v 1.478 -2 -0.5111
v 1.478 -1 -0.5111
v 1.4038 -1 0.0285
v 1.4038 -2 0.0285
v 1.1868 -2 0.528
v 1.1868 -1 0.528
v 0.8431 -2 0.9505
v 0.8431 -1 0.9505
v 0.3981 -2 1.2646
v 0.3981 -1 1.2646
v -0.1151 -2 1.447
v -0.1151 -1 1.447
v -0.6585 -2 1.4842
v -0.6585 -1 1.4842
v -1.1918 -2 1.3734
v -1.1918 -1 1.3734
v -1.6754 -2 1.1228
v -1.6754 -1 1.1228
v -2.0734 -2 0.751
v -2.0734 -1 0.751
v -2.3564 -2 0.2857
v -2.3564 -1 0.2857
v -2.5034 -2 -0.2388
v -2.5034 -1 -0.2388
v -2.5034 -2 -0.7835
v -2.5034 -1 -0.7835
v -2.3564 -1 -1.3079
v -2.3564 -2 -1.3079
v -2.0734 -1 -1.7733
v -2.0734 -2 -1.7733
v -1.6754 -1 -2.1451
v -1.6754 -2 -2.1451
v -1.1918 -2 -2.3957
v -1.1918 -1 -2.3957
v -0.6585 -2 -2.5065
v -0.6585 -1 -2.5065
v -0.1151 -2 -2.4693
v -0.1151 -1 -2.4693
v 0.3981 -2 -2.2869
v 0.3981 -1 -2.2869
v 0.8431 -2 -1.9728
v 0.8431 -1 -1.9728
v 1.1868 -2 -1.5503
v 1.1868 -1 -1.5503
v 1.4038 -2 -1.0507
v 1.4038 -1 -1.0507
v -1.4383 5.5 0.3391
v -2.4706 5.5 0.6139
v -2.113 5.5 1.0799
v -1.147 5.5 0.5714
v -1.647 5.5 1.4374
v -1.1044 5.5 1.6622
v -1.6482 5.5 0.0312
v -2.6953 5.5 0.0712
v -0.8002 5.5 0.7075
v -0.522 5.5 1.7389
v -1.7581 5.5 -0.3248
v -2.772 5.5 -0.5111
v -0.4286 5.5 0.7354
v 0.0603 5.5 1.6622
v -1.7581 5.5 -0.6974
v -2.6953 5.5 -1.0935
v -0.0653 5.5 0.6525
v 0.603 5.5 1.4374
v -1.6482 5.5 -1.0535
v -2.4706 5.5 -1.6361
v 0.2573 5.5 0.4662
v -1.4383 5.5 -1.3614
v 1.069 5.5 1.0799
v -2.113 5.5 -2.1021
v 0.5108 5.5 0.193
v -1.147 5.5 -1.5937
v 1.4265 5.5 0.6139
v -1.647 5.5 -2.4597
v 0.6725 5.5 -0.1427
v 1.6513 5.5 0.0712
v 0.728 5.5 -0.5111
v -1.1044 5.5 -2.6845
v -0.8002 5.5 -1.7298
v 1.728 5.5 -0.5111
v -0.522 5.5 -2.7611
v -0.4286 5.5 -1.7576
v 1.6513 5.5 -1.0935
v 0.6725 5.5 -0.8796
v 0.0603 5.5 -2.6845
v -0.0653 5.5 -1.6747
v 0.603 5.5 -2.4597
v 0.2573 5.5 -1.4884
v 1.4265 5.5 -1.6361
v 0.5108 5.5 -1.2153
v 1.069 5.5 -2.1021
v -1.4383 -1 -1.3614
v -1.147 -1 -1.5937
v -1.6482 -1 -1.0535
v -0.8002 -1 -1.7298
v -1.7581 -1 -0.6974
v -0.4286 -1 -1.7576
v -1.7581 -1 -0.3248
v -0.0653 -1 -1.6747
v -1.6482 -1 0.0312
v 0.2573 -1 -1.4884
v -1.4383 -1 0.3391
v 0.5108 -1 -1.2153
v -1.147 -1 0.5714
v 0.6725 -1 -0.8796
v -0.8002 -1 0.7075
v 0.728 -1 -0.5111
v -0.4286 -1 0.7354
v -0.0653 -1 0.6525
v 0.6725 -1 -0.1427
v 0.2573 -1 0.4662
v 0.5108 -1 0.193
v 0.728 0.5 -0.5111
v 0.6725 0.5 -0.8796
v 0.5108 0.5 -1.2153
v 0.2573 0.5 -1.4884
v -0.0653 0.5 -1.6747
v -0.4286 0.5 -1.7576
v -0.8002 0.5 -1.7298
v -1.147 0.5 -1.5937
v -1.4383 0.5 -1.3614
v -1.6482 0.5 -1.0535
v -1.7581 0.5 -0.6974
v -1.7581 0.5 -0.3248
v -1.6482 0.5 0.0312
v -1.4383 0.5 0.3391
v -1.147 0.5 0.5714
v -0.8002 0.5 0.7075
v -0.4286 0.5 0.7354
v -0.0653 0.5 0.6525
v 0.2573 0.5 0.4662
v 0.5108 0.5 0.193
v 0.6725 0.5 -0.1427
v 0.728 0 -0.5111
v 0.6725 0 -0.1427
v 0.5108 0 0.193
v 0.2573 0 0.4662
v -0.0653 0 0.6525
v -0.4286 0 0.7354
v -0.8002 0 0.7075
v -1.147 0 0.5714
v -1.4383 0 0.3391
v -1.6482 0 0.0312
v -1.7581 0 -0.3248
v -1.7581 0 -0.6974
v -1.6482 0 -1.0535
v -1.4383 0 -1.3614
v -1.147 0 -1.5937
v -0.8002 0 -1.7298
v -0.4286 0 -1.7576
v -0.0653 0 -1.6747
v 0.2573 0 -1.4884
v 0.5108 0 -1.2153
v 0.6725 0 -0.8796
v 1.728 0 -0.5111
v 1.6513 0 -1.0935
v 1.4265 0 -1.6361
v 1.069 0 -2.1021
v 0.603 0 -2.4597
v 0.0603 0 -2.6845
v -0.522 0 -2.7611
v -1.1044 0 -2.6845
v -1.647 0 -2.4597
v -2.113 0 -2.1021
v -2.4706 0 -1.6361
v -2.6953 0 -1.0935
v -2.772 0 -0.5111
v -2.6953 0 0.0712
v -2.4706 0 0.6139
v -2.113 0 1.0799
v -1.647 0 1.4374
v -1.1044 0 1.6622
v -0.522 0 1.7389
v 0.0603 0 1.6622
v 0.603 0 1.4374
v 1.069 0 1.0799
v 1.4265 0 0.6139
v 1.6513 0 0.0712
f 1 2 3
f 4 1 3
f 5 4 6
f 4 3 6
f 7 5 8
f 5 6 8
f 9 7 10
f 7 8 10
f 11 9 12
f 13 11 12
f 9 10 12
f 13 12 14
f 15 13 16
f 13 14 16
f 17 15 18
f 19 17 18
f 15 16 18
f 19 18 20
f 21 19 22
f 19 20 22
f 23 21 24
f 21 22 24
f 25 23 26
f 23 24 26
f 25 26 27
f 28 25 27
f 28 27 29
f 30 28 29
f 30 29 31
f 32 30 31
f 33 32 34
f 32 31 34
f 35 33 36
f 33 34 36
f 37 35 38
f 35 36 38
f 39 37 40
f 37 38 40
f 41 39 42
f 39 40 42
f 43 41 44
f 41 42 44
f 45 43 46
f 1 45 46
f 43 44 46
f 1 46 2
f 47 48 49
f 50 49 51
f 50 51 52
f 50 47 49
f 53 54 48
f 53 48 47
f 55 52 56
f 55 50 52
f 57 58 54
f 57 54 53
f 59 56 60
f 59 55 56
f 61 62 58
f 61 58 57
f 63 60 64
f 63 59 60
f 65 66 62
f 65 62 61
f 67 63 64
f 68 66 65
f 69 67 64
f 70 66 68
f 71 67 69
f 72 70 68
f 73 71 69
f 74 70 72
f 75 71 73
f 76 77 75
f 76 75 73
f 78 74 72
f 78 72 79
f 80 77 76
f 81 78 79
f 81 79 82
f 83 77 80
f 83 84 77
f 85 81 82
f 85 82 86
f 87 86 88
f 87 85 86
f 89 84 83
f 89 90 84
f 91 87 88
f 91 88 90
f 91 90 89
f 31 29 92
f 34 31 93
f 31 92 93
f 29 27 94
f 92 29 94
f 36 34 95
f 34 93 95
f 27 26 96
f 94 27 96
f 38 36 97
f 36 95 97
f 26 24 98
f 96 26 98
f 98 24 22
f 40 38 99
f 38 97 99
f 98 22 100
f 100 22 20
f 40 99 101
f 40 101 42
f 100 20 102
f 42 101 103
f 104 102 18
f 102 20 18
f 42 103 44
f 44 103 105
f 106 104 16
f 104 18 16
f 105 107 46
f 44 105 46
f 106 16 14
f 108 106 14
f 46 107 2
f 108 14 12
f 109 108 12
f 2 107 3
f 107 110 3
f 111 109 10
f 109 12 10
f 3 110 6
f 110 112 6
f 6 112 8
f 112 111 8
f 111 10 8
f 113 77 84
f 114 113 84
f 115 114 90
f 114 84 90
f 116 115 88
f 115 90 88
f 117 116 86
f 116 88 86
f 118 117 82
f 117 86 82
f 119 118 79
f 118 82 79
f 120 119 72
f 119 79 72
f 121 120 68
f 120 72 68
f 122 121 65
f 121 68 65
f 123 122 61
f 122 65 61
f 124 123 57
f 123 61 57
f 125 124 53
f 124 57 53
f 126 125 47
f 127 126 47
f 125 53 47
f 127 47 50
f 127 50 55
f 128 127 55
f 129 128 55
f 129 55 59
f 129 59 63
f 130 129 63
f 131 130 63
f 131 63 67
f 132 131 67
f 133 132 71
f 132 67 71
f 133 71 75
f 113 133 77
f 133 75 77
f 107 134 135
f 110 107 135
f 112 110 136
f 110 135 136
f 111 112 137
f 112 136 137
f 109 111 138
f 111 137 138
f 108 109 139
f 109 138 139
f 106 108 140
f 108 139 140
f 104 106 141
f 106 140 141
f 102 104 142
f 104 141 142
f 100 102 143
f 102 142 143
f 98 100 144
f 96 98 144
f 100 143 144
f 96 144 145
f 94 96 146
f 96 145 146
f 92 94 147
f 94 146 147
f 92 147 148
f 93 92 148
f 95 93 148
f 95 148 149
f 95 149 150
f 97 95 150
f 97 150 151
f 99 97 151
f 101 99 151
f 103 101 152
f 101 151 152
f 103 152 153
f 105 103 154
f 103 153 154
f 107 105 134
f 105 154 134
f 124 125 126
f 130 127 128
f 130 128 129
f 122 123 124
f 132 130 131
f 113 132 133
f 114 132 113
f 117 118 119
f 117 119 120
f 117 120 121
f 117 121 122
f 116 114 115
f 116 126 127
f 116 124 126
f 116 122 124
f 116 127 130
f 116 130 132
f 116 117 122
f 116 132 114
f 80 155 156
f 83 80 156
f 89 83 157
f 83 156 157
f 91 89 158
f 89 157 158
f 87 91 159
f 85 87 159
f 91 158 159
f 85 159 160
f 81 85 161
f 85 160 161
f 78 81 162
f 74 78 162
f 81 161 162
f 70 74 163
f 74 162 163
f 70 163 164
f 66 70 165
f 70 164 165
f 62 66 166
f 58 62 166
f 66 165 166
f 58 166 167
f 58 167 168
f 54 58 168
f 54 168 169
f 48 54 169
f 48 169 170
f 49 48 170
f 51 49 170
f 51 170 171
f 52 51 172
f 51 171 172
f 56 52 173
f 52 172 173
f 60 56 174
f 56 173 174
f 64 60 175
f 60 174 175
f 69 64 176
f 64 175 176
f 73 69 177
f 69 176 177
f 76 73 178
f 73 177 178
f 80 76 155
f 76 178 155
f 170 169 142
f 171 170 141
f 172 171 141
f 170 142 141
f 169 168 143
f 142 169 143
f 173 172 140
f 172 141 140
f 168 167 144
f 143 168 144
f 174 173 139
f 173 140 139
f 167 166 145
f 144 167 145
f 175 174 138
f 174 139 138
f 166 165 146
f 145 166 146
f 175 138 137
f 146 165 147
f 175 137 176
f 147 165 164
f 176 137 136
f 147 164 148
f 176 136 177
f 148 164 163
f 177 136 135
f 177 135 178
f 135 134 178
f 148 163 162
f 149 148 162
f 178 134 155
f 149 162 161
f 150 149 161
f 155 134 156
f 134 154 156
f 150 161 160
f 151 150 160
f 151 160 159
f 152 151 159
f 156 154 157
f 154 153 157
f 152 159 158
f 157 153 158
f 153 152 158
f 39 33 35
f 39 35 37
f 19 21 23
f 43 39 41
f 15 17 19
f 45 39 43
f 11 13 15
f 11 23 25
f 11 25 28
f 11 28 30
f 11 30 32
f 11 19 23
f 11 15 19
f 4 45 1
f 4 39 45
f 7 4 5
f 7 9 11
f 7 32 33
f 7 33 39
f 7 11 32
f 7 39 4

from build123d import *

# Parameters (mm, degrees)
SKETCH1_R           = 2.25
BOSS_EXTRUDE1_DEPTH = 5.5
SKETCH1_3_R         = 1.25
BOSS_EXTRUDE2_DEPTH = 1
SKETCH5_R           = 1.25
BOSS_EXTRUDE3_DEPTH = 1
SKETCH6_R           = 2
BOSS_EXTRUDE4_DEPTH = 1
SKETCH12_R          = 1.25
CUT_EXTRUDE1_DEPTH  = 5


with BuildPart() as part:
    # Sketch1 → Boss-Extrude1 (new body)
    with BuildSketch(Plane(origin=(0, 0, 0), x_dir=(1, 0, 0), z_dir=(0, 1, 0))):
        with Locations((-0.522013312, 0.511138034)):
            Circle(SKETCH1_R)
    extrude(amount=BOSS_EXTRUDE1_DEPTH)

    # Sketch1<3> → Boss-Extrude2 (add)
    with BuildSketch(Plane(origin=(0, 0, 0), x_dir=(1, 0, 0), z_dir=(0, 1, 0))):
        with Locations((-0.522013312, 0.511138034)):
            Circle(SKETCH1_3_R)
    extrude(amount=BOSS_EXTRUDE2_DEPTH)

    # Sketch5 → Boss-Extrude3 (add)
    with BuildSketch(Plane.XZ):
        with Locations((-0.522013312, -0.511138034)):
            Circle(SKETCH5_R)
    extrude(amount=BOSS_EXTRUDE3_DEPTH)

    # Sketch6 → Boss-Extrude4 (add)
    with BuildSketch(Plane.XZ.offset(1)):
        with Locations((-0.522013312, -0.511138034)):
            Circle(SKETCH6_R)
    extrude(amount=BOSS_EXTRUDE4_DEPTH)

    # Sketch12 → Cut-Extrude1 (cut)
    with BuildSketch(Plane(origin=(0, 5.5, 0), x_dir=(1, 0, 0), z_dir=(0, 1, 0))):
        with Locations((-0.522013312, 0.511138034)):
            Circle(SKETCH12_R)
    extrude(amount=-CUT_EXTRUDE1_DEPTH, mode=Mode.SUBTRACT)


solid = part.part
